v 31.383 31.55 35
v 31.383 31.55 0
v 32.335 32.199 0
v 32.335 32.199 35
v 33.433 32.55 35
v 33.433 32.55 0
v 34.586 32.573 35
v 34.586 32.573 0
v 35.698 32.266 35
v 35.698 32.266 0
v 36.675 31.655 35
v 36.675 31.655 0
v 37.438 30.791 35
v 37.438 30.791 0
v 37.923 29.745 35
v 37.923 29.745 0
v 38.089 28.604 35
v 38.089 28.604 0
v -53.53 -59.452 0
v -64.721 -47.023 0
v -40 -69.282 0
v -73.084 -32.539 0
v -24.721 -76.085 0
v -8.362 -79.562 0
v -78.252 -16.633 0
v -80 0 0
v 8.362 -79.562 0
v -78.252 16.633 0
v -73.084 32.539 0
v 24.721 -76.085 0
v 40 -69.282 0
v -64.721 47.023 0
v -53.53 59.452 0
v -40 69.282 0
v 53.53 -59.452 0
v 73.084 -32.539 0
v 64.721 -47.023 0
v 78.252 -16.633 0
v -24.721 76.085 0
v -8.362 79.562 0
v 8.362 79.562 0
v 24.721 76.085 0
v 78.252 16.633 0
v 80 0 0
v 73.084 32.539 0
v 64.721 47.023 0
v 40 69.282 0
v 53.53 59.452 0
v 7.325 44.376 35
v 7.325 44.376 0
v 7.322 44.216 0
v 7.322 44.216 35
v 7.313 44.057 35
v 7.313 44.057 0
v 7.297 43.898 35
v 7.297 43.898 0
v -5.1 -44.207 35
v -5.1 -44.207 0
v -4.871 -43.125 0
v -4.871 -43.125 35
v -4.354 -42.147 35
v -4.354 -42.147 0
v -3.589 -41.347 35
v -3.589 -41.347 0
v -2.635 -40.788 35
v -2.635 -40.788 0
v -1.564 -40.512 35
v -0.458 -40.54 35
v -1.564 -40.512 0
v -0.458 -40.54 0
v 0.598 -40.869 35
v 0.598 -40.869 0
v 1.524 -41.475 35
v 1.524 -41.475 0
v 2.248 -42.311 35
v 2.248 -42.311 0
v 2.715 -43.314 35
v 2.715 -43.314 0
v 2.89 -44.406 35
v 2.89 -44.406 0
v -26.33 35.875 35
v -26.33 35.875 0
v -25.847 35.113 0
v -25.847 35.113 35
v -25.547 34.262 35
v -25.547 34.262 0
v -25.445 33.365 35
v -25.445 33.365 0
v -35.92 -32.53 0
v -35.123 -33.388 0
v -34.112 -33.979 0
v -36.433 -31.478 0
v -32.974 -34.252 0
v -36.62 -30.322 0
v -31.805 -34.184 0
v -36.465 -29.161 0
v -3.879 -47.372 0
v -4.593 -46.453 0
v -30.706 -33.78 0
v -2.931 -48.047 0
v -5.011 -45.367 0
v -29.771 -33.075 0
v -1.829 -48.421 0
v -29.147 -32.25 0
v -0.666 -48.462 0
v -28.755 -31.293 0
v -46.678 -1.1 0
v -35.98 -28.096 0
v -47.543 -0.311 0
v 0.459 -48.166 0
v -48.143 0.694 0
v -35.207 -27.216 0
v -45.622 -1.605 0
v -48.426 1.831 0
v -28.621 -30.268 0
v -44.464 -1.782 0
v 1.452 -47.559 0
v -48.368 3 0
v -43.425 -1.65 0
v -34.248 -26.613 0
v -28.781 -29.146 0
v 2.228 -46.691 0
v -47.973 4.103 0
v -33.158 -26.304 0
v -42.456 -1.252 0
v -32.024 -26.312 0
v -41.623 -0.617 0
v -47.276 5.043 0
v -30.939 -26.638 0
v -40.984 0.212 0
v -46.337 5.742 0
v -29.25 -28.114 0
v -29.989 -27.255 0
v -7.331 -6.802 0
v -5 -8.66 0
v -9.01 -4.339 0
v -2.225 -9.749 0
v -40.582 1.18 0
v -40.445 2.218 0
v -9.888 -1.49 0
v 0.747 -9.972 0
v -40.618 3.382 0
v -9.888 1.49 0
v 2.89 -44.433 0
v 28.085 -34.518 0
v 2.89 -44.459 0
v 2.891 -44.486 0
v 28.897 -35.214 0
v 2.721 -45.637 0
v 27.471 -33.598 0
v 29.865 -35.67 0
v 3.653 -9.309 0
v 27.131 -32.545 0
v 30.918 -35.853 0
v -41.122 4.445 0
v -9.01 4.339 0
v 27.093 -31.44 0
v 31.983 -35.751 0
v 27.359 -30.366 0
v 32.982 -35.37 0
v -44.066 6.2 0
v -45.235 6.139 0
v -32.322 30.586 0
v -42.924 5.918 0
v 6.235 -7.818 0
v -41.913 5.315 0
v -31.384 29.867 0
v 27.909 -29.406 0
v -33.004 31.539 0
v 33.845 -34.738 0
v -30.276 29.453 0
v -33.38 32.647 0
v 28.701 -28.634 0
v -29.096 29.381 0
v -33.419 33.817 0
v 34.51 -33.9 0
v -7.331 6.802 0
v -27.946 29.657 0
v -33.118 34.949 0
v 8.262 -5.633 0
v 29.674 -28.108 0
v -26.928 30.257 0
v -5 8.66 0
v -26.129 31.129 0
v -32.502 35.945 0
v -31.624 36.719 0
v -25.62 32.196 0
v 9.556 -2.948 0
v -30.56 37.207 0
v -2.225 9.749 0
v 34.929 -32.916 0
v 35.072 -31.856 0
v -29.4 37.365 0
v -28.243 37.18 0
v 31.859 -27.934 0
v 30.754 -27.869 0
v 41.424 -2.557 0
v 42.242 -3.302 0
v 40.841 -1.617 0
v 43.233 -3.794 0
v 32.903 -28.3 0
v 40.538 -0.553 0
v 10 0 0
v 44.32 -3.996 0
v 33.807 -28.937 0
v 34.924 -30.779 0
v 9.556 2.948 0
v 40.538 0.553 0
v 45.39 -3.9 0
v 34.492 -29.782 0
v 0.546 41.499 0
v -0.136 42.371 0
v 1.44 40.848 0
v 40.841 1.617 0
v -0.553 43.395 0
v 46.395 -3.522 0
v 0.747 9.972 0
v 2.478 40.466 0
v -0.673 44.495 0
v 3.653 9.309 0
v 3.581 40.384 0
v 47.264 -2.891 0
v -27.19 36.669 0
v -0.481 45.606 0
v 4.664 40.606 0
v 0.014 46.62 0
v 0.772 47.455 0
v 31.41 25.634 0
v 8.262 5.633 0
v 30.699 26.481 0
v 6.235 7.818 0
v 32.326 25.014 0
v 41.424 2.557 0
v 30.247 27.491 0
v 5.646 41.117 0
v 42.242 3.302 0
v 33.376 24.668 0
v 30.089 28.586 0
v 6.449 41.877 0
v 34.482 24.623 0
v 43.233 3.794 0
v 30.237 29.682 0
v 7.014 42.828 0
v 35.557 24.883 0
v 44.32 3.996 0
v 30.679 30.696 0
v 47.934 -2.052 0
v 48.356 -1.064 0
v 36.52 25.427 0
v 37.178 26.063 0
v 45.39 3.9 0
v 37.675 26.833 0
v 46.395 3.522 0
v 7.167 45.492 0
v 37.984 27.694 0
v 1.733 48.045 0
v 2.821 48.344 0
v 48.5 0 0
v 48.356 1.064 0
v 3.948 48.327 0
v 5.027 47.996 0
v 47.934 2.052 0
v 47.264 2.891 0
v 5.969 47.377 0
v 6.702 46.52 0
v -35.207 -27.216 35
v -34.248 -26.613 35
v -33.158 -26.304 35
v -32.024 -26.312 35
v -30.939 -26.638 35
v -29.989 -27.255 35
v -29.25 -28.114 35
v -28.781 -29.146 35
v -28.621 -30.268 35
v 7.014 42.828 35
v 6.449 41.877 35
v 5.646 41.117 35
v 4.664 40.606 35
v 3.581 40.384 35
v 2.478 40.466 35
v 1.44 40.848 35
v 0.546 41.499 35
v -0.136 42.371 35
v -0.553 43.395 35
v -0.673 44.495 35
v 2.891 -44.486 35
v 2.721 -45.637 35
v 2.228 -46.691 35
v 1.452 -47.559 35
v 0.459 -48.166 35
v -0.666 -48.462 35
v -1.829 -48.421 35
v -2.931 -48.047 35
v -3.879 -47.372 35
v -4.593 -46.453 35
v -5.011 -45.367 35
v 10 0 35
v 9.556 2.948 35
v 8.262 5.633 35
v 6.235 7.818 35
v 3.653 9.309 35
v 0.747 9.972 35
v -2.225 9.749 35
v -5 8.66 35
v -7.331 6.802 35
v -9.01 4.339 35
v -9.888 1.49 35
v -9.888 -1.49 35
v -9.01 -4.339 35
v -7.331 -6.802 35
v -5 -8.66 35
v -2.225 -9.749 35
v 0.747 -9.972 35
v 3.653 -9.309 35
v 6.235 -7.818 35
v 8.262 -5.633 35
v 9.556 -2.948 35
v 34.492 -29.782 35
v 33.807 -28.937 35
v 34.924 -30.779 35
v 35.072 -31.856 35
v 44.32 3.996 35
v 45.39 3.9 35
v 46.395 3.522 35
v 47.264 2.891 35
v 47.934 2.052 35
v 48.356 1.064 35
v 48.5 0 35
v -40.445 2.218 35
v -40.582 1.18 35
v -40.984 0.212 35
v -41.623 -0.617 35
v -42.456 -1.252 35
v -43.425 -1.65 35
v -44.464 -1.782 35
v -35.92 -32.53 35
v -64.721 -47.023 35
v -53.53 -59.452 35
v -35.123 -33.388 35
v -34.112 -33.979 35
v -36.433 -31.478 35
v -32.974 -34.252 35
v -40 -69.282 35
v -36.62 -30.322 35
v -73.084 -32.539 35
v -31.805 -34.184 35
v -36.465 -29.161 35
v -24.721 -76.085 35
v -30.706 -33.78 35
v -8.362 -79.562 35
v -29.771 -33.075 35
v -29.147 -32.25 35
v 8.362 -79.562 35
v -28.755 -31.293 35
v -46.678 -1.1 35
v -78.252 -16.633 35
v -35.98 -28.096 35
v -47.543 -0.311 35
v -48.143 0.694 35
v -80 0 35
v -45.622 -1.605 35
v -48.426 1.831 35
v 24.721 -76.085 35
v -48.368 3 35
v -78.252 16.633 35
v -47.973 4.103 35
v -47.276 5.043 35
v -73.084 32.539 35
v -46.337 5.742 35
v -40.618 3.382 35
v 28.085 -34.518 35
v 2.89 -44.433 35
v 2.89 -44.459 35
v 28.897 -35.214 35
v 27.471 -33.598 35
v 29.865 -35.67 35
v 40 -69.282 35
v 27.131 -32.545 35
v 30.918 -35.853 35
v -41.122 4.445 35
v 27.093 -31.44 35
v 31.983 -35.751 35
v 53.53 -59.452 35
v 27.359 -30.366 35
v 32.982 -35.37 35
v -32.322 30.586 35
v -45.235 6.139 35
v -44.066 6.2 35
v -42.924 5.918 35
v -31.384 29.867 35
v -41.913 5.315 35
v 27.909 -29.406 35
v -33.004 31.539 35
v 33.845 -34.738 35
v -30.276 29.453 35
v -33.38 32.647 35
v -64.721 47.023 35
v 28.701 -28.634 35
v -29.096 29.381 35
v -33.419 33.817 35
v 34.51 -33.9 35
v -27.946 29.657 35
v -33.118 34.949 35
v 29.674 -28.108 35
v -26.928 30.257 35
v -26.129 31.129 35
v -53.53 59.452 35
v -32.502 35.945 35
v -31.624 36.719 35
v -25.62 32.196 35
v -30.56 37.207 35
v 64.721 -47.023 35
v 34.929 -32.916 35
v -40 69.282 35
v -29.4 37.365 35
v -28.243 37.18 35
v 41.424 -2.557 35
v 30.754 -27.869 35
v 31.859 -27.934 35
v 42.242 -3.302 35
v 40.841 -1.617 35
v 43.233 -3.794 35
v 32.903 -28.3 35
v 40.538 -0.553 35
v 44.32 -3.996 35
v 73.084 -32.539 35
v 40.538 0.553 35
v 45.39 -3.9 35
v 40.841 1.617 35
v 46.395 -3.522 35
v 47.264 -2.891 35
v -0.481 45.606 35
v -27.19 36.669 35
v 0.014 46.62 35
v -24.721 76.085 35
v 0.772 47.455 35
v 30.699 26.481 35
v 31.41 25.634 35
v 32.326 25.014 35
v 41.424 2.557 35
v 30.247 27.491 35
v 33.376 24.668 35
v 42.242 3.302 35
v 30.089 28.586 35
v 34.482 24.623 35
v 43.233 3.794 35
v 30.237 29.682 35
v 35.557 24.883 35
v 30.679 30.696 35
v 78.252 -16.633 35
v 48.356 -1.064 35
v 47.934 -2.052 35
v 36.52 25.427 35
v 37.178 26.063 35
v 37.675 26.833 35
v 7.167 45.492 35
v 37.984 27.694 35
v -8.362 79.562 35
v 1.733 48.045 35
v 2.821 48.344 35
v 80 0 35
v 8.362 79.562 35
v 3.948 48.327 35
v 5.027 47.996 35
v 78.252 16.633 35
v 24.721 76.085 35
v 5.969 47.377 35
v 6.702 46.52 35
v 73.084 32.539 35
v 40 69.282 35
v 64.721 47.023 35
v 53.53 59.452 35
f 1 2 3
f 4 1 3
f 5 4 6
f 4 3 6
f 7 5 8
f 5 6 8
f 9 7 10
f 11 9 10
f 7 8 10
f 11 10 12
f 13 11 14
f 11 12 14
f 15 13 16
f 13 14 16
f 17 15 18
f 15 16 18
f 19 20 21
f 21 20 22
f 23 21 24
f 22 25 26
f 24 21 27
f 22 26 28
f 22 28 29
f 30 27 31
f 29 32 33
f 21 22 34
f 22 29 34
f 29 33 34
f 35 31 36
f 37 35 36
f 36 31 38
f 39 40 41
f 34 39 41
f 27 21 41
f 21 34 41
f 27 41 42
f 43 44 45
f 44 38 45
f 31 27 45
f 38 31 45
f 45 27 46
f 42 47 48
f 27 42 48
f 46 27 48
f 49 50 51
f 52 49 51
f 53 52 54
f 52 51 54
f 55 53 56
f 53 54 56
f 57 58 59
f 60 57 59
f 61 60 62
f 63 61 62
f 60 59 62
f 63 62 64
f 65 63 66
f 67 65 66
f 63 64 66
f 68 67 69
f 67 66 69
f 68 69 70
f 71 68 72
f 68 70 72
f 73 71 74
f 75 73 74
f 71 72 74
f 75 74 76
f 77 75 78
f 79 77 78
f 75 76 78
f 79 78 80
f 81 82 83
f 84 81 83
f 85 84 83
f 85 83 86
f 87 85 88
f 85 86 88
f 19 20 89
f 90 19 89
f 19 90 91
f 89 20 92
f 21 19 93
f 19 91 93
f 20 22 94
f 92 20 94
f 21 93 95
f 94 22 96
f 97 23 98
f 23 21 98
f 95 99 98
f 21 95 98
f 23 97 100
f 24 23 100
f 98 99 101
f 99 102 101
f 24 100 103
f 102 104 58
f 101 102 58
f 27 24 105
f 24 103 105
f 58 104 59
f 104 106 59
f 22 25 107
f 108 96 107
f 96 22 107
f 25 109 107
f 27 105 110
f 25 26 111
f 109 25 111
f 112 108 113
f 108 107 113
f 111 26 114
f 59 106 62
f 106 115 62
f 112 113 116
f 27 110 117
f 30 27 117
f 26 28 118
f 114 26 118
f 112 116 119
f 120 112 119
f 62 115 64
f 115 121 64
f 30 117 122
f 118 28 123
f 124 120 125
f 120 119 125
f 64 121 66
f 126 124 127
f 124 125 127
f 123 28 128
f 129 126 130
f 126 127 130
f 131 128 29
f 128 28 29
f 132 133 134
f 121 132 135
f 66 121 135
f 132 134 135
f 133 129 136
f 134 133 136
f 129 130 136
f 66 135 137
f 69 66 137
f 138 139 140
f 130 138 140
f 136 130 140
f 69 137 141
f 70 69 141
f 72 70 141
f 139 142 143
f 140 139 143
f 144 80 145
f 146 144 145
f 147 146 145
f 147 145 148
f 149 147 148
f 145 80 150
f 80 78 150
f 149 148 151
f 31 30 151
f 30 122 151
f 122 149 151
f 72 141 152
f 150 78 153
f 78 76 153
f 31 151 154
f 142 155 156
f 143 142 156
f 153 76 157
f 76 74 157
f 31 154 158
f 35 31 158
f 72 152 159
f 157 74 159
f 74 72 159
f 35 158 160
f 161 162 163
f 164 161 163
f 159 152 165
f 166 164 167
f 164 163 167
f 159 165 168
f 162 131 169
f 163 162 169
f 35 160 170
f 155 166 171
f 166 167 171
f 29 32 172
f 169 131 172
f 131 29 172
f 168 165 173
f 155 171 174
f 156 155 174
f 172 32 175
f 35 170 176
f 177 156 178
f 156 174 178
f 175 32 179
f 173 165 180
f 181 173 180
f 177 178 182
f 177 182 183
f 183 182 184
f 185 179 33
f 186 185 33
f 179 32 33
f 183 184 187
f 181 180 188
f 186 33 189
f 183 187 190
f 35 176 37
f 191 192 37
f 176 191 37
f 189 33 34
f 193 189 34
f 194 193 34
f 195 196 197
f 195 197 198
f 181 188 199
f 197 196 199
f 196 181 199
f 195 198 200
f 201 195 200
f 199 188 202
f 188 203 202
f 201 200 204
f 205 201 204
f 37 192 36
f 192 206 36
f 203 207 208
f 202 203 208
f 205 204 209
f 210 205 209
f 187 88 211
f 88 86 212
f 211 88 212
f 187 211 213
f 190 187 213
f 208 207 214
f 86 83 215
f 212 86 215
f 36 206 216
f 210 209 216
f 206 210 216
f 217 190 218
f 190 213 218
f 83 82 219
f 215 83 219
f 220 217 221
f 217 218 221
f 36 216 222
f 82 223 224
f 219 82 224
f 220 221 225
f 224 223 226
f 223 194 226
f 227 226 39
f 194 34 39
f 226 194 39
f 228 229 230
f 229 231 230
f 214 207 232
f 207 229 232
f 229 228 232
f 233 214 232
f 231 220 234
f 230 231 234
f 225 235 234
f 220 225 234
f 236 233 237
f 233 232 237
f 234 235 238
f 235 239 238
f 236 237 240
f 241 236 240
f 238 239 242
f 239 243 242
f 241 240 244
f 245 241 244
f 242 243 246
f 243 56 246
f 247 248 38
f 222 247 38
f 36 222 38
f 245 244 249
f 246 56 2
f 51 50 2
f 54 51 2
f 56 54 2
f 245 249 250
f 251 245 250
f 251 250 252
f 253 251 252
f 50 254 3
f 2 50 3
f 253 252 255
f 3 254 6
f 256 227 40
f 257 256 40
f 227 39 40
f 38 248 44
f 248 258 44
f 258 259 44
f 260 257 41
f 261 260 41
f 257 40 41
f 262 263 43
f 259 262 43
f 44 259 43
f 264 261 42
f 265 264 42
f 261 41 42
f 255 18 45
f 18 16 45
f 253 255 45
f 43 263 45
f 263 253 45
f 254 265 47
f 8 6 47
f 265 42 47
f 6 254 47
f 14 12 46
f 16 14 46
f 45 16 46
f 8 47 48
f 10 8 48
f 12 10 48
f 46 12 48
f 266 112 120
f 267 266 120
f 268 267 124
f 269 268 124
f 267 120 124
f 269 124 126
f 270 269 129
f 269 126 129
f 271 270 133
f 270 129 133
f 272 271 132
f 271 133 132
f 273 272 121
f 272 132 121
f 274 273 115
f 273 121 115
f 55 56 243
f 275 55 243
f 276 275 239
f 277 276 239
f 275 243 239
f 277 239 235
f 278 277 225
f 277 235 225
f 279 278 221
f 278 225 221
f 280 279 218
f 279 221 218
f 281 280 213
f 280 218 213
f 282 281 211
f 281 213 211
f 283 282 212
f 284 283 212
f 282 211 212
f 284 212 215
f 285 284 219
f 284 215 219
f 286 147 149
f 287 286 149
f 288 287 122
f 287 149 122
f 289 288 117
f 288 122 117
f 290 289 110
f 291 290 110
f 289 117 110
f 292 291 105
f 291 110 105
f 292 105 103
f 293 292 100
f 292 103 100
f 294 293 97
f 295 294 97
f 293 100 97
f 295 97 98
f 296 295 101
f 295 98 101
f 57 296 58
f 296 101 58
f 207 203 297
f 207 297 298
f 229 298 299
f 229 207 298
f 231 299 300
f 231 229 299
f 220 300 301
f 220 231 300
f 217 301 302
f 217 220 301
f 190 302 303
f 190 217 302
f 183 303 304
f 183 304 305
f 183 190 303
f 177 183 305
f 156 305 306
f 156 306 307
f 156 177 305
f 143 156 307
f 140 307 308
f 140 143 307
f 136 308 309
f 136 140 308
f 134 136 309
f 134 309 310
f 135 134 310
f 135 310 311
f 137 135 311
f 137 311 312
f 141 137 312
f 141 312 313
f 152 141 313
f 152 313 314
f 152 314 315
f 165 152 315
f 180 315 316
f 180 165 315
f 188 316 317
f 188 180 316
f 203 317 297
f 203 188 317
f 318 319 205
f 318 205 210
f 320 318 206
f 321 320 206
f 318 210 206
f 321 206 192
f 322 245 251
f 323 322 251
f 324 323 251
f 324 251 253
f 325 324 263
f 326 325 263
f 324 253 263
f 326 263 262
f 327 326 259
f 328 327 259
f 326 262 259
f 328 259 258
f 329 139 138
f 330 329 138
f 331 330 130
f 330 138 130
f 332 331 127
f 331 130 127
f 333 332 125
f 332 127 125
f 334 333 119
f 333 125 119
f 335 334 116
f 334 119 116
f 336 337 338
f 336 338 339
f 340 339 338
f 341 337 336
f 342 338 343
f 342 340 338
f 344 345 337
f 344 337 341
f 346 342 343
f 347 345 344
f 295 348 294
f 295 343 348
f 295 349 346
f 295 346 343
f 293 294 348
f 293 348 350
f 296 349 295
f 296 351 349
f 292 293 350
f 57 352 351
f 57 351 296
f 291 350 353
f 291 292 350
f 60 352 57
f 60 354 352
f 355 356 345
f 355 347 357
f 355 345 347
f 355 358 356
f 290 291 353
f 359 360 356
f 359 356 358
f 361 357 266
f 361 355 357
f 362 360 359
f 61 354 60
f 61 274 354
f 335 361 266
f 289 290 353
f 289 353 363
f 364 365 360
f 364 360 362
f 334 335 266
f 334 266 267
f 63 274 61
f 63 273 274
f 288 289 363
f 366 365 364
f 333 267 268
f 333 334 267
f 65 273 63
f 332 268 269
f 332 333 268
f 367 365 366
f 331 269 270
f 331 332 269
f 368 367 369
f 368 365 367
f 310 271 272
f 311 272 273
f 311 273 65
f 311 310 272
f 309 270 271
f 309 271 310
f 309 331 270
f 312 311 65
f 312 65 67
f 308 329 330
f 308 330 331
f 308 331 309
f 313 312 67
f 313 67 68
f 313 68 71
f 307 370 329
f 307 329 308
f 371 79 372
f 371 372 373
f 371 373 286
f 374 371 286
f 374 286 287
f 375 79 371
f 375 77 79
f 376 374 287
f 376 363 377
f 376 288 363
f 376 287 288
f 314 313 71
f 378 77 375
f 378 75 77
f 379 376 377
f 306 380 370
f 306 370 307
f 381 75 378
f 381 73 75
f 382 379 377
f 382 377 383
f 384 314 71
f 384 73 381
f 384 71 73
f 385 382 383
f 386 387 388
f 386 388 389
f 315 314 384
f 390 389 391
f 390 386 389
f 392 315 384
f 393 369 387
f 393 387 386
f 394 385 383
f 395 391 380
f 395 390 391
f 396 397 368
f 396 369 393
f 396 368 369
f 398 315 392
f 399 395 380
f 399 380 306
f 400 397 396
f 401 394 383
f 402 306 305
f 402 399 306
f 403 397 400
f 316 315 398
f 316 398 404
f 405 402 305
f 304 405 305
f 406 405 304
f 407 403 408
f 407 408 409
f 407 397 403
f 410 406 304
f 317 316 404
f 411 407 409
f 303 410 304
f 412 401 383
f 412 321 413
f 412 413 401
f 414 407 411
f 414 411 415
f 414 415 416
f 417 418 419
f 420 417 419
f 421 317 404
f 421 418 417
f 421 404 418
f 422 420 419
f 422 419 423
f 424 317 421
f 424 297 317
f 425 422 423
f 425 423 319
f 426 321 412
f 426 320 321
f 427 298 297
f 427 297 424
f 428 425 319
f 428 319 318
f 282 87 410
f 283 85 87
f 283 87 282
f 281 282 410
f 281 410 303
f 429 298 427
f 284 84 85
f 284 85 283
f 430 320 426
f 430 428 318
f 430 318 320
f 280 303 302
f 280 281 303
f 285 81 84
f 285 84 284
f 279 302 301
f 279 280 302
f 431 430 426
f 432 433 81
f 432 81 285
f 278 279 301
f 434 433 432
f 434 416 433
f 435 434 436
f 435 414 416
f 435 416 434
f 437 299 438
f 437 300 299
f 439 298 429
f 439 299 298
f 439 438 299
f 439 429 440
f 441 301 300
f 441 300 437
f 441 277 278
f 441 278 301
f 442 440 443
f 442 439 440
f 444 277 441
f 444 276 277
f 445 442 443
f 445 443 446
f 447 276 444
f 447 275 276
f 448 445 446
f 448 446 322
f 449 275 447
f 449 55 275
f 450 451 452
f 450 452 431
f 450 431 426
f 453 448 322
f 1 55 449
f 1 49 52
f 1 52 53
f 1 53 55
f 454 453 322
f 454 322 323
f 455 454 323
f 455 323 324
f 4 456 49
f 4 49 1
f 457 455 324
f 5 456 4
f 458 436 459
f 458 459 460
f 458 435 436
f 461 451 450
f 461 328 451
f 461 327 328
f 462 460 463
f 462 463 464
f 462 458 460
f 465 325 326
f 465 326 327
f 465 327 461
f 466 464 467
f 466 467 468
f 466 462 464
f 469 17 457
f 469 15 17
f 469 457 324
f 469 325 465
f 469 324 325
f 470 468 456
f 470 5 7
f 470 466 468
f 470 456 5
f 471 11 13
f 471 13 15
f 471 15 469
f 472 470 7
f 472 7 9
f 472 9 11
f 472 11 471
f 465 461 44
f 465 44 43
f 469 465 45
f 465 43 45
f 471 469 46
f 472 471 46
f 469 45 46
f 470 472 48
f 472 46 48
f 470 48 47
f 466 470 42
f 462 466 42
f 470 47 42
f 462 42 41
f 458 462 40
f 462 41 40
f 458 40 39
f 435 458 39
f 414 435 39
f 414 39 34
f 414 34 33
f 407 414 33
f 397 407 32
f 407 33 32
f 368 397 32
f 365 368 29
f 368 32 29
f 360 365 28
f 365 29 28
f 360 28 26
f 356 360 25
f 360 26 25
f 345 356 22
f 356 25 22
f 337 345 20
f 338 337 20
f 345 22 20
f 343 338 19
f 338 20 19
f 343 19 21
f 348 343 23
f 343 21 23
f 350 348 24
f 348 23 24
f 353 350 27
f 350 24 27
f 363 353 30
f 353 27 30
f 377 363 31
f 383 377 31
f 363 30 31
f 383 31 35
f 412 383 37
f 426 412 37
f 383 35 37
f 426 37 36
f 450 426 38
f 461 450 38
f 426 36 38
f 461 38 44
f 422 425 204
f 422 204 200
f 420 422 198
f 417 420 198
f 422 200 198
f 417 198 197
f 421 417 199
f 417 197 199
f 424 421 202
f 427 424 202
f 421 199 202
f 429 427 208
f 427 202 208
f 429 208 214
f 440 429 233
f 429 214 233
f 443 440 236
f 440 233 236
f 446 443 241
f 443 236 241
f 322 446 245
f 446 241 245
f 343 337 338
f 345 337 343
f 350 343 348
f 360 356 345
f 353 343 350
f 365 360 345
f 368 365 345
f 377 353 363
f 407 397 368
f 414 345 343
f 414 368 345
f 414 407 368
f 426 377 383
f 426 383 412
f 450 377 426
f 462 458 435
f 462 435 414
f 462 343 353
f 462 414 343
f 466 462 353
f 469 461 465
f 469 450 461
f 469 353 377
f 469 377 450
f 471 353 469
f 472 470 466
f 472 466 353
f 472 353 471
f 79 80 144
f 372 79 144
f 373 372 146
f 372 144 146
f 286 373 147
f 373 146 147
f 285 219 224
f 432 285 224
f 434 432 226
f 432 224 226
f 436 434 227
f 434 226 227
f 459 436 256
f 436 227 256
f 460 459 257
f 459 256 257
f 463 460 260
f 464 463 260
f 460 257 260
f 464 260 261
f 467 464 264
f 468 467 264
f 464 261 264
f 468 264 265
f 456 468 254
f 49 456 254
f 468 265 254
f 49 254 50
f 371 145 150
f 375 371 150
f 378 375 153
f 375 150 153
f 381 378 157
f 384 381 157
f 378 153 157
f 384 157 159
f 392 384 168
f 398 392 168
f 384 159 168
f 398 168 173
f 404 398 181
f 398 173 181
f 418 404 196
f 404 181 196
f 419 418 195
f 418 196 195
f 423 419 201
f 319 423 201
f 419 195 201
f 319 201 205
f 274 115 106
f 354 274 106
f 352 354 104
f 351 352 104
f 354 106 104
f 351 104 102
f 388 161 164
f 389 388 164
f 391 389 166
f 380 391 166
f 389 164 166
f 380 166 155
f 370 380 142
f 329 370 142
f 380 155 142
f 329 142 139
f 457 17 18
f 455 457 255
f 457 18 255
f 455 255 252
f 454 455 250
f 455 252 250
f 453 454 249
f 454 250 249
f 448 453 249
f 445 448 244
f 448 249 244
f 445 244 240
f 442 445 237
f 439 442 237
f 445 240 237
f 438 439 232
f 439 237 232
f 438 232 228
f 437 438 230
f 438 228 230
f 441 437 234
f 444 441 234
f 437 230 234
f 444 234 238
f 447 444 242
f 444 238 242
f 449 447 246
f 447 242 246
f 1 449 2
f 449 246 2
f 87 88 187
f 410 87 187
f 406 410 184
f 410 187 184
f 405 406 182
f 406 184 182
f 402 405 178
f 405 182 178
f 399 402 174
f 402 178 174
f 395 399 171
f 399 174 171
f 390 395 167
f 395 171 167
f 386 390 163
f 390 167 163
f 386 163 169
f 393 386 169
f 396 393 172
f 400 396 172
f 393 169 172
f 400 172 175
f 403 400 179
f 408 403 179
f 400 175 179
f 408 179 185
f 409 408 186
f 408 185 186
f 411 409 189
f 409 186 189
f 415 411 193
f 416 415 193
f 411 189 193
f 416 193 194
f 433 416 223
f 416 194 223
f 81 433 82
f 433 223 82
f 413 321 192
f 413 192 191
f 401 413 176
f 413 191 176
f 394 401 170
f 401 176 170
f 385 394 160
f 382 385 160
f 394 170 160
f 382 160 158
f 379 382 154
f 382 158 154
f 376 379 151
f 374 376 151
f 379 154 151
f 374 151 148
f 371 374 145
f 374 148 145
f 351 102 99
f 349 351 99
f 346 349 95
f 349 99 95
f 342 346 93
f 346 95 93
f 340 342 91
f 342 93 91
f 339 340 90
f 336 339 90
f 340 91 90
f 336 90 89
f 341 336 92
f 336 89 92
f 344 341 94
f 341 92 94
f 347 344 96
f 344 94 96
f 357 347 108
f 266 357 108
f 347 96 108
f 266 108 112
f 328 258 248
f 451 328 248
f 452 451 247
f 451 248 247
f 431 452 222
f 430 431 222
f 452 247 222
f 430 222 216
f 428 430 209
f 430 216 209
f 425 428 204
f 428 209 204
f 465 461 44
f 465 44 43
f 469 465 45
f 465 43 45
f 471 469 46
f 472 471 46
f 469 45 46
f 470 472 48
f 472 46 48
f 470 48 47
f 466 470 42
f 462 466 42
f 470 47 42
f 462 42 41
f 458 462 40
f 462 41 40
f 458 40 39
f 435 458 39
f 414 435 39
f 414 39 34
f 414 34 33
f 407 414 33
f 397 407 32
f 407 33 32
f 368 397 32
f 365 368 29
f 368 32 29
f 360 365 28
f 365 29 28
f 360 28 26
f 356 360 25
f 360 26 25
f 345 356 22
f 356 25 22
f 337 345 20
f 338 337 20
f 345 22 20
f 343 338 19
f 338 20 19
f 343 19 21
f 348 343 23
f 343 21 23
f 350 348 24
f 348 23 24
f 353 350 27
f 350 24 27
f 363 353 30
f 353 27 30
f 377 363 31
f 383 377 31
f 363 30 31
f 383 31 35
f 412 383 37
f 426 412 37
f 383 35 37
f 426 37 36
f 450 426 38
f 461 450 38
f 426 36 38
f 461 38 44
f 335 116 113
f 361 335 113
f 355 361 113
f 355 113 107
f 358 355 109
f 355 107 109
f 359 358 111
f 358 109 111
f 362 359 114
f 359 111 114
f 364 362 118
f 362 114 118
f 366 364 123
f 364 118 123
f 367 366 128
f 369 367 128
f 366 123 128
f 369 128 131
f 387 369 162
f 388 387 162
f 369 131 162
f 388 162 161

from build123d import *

# Parameters (mm, degrees)
F1_R     = 80
F1_R_2   = 10
F2_DEPTH = 35
F0_R     = 80


with BuildPart() as f2:
    # F1 (on face) → F2 (new body)
    with BuildSketch(Plane.XY):
        Circle(F1_R)
        with BuildLine():
            ThreePointArc((36.5198141961, 25.4274098382), (41.816321625, 15.219896378), (44.3202247191, 3.9959580639))
            ThreePointArc((44.3202247191, 3.9959580639), (47.2641362915, 2.8912887372), (48.5, 0))
            ThreePointArc((48.5, 0), (47.2641362915, -2.8912887372), (44.3202247191, -3.9959580639))
            ThreePointArc((44.3202247191, -3.9959580639), (41.0056914282, -17.2853484342), (33.8065865937, -28.9372545844))
            ThreePointArc((33.8065865937, -28.9372545844), (34.7417013955, -30.2655077164), (35.0715384048, -31.8560747921))
            ThreePointArc((35.0715384048, -31.8560747921), (32.4955470922, -35.5940153023), (28.0854387758, -34.5175046719))
            ThreePointArc((28.0854387758, -34.5175046719), (16.2576755843, -41.4238818147), (2.889782188, -44.4060711942))
            ThreePointArc((2.889782188, -44.4060711942), (2.8903837052, -44.446117889), (2.8905842177, -44.486168599))
            ThreePointArc((2.8905842177, -44.486168599), (-1.249171812, -48.483726385), (-5.0996499084, -44.2068271968))
            ThreePointArc((-5.0996499084, -44.2068271968), (-18.3022760893, -40.5620104279), (-29.7710819539, -33.0746531243))
            ThreePointArc((-29.7710819539, -33.0746531243), (-35.5530157837, -32.9883777819), (-35.2069654266, -27.2161640473))
            ThreePointArc((-35.2069654266, -27.2161640473), (-41.816321625, -15.219896378), (-44.4643132569, -1.7818099194))
            ThreePointArc((-44.4643132569, -1.7818099194), (-48.4397106791, 2.4175254545), (-44.0659491194, 6.200171627))
            ThreePointArc((-44.0659491194, 6.200171627), (-40.0931146217, 19.3078263907), (-32.3221592599, 30.5864025472))
            ThreePointArc((-32.3221592599, 30.5864025472), (-32.0917631234, 36.3643883439), (-26.3299707716, 35.8745402642))
            ThreePointArc((-26.3299707716, 35.8745402642), (-14.1726559362, 42.1827669044), (-0.6727300137, 44.4949147019))
            ThreePointArc((-0.6727300137, 44.4949147019), (3.385168671, 48.3751237443), (7.3254891646, 44.3755689746))
            ThreePointArc((7.3254891646, 44.3755689746), (7.3183202232, 44.1361945028), (7.2968390957, 43.8976780617))
            ThreePointArc((7.2968390957, 43.8976780617), (20.3013742522, 39.5992954921), (31.3827095316, 31.5495727777))
            ThreePointArc((31.3827095316, 31.5495727777), (35.6975372065, 32.2663616126), (38.0889777188, 28.6040486311))
            ThreePointArc((38.0889777188, 28.6040486311), (37.6752951831, 26.8325162308), (36.5198141961, 25.4274098382))
        make_face(mode=Mode.SUBTRACT)
        with BuildLine():
            ThreePointArc((44.3202247191, -3.9959580639), (40.5, 0), (44.3202247191, 3.9959580639))
            ThreePointArc((44.3202247191, 3.9959580639), (41.816321625, 15.219896378), (36.5198141961, 25.4274098382))
            ThreePointArc((36.5198141961, 25.4274098382), (31.0247999463, 26.0328981923), (31.3827095316, 31.5495727777))
            ThreePointArc((31.3827095316, 31.5495727777), (20.3013742522, 39.5992954921), (7.2968390957, 43.8976780617))
            ThreePointArc((7.2968390957, 43.8976780617), (3.0265687903, 40.3867537858), (-0.6727300137, 44.4949147019))
            ThreePointArc((-0.6727300137, 44.4949147019), (-14.1726559362, 42.1827669044), (-26.3299707716, 35.8745402642))
            ThreePointArc((-26.3299707716, 35.8745402642), (-25.6727395604, 34.6956401694), (-25.4450197731, 33.3652635321))
            ThreePointArc((-25.4450197731, 33.3652635321), (-27.9464467764, 29.6565873567), (-32.3221592599, 30.5864025472))
            ThreePointArc((-32.3221592599, 30.5864025472), (-40.0931146217, 19.3078263907), (-44.0659491194, 6.200171627))
            ThreePointArc((-44.0659491194, 6.200171627), (-41.4853810918, 4.9093372319), (-40.4446829942, 2.2181419119))
            ThreePointArc((-40.4446829942, 2.2181419119), (-41.6232047514, -0.6172170646), (-44.4643132569, -1.7818099194))
            ThreePointArc((-44.4643132569, -1.7818099194), (-41.816321625, -15.219896378), (-35.2069654266, -27.2161640473))
            ThreePointArc((-35.2069654266, -27.2161640473), (-30.9392358955, -26.6383185304), (-28.6208082964, -30.2676868308))
            ThreePointArc((-28.6208082964, -30.2676868308), (-28.919531127, -31.7844423533), (-29.7710819539, -33.0746531243))
            ThreePointArc((-29.7710819539, -33.0746531243), (-18.3022760893, -40.5620104279), (-5.0996499084, -44.2068271968))
            ThreePointArc((-5.0996499084, -44.2068271968), (-1.0096930154, -40.487411871), (2.889782188, -44.4060711942))
            ThreePointArc((2.889782188, -44.4060711942), (16.2576755843, -41.4238818147), (28.0854387758, -34.5175046719))
            ThreePointArc((28.0854387758, -34.5175046719), (28.2785911325, -28.992607395), (33.8065865937, -28.9372545844))
            ThreePointArc((33.8065865937, -28.9372545844), (41.0056914282, -17.2853484342), (44.3202247191, -3.9959580639))
        make_face()
        Circle(F1_R_2, mode=Mode.SUBTRACT)
    extrude(amount=F2_DEPTH)


with BuildPart() as f2b:
    # F0 (on Top) → F2, piece 2 (new body)
    with BuildSketch(Plane.XY):
        Circle(F0_R)
    extrude(amount=F2_DEPTH)


solid = Compound([f2.part, f2b.part])
